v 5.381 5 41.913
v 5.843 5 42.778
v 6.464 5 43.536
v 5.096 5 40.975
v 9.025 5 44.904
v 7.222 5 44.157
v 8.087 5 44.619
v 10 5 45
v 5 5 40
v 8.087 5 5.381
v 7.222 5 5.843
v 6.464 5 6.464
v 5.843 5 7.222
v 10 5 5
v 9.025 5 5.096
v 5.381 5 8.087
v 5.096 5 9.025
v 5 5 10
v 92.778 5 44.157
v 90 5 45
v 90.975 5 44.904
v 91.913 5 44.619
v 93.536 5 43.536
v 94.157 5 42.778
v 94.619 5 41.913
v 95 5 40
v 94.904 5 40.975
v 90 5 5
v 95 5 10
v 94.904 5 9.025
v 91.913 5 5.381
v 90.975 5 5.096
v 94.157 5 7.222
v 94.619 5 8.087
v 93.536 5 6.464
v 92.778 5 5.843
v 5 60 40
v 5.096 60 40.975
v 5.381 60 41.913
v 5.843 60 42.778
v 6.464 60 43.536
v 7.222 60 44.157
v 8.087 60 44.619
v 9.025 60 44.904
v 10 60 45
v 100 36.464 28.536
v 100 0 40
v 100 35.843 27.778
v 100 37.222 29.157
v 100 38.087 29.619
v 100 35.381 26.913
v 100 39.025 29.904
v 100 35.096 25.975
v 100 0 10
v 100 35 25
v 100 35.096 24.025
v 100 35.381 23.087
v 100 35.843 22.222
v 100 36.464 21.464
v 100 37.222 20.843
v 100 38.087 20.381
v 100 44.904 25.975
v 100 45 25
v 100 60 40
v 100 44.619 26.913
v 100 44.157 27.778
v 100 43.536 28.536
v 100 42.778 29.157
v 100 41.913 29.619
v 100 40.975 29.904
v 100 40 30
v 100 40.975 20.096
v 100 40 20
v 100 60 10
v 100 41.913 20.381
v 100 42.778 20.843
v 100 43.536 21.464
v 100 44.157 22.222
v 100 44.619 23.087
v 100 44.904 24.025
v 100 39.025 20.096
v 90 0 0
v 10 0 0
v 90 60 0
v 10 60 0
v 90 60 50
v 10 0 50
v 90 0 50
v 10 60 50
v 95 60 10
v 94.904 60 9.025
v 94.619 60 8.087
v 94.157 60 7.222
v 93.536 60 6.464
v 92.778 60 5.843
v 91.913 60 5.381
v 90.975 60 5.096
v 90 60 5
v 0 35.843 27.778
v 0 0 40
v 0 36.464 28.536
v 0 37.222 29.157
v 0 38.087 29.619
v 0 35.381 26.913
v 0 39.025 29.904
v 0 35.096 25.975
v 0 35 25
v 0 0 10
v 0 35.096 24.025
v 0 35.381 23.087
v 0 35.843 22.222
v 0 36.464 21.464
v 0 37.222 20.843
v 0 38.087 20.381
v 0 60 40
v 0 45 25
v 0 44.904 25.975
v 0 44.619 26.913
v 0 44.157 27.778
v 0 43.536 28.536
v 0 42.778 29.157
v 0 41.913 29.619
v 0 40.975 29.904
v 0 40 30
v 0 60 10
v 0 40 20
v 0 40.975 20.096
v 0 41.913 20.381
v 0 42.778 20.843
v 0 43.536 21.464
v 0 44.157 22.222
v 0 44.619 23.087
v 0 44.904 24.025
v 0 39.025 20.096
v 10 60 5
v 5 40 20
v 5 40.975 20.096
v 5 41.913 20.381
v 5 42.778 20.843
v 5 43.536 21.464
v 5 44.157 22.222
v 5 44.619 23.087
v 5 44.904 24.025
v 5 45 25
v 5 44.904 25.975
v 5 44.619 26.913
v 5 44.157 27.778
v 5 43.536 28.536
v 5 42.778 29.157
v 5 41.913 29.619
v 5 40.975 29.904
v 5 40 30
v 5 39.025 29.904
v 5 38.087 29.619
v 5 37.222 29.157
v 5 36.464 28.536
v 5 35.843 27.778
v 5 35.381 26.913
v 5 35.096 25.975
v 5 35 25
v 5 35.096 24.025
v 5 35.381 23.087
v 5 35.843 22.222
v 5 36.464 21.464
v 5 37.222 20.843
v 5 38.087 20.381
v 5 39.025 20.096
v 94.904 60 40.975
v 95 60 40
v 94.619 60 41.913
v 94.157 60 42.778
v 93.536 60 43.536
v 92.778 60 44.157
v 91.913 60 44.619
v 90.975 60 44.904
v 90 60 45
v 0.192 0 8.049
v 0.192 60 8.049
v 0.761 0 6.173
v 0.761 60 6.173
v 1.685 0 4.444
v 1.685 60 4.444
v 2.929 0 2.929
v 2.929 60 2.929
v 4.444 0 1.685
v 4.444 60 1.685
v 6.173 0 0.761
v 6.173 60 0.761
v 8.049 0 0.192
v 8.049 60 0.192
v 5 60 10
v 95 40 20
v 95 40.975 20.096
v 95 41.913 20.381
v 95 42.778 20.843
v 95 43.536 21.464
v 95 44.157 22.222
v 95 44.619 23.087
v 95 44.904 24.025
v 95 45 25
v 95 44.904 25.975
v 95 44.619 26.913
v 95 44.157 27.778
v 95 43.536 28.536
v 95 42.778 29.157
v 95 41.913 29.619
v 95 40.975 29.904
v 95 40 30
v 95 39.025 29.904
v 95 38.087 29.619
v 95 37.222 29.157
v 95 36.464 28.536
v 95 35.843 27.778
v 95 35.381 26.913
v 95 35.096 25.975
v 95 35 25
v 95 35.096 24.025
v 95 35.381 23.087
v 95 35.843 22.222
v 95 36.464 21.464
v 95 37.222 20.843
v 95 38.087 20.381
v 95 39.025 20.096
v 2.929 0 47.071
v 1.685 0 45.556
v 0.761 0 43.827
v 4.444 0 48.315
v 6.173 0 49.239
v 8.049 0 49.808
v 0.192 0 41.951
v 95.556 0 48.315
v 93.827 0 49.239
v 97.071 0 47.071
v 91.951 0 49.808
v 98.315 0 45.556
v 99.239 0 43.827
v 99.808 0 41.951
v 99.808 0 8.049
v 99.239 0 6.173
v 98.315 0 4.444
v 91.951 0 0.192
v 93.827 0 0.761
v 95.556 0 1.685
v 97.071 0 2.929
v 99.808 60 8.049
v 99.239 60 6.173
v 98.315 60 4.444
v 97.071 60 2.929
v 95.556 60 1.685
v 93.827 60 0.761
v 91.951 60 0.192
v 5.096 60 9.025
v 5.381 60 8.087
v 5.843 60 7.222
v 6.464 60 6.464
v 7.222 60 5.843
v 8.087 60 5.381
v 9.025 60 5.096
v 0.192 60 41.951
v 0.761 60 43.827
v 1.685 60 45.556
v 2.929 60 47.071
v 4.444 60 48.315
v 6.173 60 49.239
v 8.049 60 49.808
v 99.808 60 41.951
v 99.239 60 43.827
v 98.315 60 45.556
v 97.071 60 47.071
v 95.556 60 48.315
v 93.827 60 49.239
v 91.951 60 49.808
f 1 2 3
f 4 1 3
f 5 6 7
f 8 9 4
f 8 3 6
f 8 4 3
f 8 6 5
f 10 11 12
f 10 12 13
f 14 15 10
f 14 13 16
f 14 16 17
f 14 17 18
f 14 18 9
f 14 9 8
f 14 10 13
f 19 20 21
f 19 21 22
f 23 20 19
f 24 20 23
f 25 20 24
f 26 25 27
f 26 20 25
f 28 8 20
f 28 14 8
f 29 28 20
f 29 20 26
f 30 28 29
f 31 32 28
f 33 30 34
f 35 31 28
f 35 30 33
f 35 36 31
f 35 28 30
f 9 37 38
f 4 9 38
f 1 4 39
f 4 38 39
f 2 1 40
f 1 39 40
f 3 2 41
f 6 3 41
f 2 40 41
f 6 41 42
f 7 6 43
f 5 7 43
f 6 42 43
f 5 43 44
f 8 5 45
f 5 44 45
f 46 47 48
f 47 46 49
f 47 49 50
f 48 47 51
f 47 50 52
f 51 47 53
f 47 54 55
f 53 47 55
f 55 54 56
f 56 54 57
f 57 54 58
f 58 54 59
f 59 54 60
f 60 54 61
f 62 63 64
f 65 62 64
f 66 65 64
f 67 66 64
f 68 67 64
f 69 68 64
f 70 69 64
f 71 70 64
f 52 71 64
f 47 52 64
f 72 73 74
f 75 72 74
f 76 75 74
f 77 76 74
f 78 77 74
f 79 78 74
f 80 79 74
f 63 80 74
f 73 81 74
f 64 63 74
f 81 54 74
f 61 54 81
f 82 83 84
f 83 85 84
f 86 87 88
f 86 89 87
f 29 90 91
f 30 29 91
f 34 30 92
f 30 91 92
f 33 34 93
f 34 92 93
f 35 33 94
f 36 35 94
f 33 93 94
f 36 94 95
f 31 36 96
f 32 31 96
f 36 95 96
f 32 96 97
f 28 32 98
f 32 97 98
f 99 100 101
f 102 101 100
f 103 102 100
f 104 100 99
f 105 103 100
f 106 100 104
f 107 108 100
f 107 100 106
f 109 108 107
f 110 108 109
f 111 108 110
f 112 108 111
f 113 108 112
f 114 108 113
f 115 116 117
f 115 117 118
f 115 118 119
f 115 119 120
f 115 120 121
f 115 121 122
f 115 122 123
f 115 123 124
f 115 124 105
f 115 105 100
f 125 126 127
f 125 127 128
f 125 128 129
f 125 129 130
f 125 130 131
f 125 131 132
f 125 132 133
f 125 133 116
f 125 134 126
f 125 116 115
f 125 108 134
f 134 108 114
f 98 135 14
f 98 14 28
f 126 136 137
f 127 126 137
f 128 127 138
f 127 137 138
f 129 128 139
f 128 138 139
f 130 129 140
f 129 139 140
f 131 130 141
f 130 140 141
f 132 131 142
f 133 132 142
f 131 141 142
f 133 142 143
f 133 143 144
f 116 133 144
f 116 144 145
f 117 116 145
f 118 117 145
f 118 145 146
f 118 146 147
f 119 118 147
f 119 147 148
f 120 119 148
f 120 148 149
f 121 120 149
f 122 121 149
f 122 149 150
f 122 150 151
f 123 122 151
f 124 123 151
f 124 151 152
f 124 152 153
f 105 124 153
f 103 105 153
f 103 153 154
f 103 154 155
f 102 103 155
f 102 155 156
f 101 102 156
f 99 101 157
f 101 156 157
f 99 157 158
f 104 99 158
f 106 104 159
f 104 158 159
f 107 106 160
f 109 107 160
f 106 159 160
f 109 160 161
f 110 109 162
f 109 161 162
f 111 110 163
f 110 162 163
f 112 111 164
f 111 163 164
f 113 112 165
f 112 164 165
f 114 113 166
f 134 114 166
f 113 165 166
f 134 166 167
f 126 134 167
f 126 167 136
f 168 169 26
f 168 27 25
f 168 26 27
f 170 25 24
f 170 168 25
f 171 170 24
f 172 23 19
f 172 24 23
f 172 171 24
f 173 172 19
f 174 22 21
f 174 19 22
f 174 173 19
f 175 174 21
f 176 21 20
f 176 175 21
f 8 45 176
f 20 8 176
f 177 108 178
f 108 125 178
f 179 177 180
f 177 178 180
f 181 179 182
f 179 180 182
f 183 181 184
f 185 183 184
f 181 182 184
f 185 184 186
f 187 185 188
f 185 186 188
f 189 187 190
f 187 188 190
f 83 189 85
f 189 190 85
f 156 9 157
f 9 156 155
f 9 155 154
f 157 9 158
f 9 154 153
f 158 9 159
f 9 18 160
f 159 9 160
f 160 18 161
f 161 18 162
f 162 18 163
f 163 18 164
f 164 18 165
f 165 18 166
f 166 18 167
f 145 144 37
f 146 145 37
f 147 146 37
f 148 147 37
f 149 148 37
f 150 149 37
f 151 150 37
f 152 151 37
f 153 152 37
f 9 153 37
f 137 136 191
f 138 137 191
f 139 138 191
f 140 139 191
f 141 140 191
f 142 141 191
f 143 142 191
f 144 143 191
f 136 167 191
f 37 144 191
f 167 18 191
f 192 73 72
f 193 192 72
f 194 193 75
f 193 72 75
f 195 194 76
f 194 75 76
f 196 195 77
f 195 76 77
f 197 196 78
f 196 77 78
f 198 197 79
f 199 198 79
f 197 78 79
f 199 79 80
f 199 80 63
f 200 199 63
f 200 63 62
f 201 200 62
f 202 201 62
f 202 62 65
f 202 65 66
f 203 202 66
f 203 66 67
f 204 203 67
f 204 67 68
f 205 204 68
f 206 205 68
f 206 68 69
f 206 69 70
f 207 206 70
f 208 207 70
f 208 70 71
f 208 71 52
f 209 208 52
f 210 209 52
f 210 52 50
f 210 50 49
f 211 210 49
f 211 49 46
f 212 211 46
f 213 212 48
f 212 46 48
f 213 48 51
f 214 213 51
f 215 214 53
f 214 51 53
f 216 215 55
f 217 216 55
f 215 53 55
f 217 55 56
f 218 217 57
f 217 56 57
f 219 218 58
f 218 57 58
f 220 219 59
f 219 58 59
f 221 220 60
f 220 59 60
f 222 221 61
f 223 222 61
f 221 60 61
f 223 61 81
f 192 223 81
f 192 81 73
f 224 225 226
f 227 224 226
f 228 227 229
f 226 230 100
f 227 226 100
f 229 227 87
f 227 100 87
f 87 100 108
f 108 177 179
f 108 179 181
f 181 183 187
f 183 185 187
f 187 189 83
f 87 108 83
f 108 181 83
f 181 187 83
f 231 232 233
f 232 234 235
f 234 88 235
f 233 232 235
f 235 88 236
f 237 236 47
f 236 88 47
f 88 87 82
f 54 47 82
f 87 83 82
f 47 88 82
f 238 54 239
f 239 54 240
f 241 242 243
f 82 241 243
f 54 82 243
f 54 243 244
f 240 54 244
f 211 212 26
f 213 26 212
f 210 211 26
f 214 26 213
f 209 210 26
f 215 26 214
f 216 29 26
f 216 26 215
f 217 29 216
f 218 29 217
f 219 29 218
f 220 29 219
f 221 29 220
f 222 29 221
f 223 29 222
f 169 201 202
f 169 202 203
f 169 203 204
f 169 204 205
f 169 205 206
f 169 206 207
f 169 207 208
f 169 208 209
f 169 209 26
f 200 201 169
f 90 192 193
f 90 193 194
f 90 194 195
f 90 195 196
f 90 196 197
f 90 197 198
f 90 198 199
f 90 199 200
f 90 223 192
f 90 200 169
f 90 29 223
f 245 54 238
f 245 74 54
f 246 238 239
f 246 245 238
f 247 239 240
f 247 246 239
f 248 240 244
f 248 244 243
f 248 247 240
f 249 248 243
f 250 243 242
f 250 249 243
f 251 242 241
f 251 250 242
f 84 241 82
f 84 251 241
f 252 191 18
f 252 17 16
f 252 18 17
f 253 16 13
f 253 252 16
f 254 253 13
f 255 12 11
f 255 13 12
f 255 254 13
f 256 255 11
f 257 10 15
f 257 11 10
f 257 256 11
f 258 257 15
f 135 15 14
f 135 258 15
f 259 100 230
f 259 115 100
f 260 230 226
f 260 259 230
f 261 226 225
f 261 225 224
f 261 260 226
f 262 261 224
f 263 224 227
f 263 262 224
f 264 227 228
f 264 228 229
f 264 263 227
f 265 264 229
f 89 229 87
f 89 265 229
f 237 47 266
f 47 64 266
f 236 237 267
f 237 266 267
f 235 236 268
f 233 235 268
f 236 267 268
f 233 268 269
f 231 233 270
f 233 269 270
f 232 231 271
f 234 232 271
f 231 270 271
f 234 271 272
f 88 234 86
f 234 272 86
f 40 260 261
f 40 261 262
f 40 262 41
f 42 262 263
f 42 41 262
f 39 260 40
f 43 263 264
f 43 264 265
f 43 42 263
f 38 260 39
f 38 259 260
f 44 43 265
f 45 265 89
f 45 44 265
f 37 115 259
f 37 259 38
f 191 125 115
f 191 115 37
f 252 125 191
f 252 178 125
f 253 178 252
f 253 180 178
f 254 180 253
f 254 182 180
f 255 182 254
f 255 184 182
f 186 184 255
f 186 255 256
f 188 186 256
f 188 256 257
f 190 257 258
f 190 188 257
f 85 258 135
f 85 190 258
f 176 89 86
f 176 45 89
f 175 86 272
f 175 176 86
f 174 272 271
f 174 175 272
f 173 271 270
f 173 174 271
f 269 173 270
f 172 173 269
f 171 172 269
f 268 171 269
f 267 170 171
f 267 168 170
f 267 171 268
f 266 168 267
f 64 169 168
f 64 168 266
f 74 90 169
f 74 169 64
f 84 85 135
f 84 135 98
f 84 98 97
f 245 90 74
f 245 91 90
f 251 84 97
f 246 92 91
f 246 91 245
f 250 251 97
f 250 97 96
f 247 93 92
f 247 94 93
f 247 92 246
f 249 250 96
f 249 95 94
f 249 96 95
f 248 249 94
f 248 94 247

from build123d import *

# Parameters (mm, degrees)
SKETCH1_W           = 100
SKETCH1_H           = 60
BOSS_EXTRUDE1_DEPTH = 50
FILLET1_R           = 10
SHELL1_T            = -5
SKETCH2_R           = 5
CUT_EXTRUDE1_DEPTH  = 101


with BuildPart() as part:
    # Sketch1 → Boss-Extrude1 (new body)
    with BuildSketch(Plane.XY):
        with Locations((50, 30)):
            Rectangle(SKETCH1_W, SKETCH1_H)
    extrude(amount=BOSS_EXTRUDE1_DEPTH)

    # Fillet1
    fillet1_edges = [part.edges().sort_by_distance(p)[0] for p in [
        (100, 30, 50),
        (0, 30, 50),
        (100, 30, 0),
        (0, 30, 0),
    ]]
    fillet(fillet1_edges, radius=FILLET1_R)

    # Shell1
    shell1_openings = [part.faces().sort_by_distance(p)[0] for p in [
        (50, 60, 25),
    ]]
    offset(amount=SHELL1_T, openings=shell1_openings, kind=Kind.INTERSECTION)

    # Sketch2 → Cut-Extrude1 (cut, through all)
    with BuildSketch(Plane(origin=(100, 0, 0), x_dir=(0, 0, -1), z_dir=(1, 0, 0))):
        with Locations((-25, 40)):
            Circle(SKETCH2_R)
    extrude(amount=-CUT_EXTRUDE1_DEPTH, mode=Mode.SUBTRACT)


solid = part.part
